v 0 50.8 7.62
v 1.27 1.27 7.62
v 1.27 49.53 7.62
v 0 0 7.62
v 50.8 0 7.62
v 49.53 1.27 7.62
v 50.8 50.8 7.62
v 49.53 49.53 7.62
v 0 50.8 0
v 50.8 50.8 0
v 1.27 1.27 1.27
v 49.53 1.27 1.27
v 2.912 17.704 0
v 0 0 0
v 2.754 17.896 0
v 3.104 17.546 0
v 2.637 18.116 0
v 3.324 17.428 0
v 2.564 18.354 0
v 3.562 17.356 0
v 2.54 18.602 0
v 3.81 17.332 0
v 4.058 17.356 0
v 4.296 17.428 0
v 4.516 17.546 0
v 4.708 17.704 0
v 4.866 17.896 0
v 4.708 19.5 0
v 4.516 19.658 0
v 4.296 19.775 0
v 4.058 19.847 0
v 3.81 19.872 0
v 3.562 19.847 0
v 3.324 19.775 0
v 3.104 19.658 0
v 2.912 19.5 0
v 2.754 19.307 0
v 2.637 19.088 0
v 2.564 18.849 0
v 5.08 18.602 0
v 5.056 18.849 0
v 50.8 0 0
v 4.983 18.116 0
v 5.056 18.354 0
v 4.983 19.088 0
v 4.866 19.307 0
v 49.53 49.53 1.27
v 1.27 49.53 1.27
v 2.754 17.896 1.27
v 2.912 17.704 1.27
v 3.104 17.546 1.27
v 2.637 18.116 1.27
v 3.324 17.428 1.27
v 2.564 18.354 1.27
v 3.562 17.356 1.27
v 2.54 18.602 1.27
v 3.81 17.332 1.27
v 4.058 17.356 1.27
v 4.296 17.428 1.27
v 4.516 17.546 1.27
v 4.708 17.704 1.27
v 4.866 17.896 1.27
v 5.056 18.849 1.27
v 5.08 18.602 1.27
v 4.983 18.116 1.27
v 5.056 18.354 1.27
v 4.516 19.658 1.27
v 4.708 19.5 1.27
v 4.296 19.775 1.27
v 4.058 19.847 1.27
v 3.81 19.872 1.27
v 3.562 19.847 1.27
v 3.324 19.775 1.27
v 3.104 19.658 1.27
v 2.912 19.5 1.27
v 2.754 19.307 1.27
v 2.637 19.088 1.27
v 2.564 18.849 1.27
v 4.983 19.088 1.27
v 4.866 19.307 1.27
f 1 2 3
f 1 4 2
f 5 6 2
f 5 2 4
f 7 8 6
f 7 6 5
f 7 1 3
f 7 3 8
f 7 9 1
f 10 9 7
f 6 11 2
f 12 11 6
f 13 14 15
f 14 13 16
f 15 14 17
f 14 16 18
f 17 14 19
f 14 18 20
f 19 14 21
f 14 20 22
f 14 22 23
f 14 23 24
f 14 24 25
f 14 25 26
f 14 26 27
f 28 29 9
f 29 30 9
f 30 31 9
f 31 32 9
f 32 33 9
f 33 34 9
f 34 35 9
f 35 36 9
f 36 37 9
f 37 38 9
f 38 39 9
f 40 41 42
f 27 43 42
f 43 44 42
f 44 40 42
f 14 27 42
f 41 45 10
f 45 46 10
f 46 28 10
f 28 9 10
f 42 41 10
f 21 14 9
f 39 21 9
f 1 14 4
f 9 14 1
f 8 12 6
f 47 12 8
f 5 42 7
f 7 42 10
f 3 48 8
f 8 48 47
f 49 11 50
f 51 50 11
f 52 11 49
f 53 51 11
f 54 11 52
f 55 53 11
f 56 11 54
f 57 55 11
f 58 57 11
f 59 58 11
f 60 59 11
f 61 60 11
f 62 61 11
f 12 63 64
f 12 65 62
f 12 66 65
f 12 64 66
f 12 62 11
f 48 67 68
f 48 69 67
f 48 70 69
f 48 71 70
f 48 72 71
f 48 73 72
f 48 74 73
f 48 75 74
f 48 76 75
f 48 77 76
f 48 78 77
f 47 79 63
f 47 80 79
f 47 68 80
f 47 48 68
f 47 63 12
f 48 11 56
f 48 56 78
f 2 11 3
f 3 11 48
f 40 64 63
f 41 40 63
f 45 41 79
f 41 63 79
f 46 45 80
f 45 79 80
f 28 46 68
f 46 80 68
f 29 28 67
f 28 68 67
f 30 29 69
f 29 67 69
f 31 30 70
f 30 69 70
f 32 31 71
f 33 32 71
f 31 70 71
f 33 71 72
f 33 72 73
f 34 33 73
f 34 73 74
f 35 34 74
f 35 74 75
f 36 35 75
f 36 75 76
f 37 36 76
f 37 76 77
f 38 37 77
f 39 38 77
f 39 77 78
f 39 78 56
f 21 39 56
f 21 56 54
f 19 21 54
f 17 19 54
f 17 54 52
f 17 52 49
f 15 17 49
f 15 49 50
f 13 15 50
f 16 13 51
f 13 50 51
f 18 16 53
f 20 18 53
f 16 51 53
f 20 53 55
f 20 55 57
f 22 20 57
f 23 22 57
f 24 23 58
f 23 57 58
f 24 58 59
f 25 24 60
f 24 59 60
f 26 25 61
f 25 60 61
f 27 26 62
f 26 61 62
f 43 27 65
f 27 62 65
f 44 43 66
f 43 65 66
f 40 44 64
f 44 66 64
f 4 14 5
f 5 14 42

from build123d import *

# Parameters (mm, degrees)
F0_W     = 50.8
F0_H     = 50.8
F1_DEPTH = 7.62
F2_T     = -1.27
F3_R     = 1.27
F4_DEPTH = 25.4


with BuildPart() as f1:
    # F0 (on Top) → F1 (new body)
    with BuildSketch(Plane.XY):
        with Locations((25.4, 25.4)):
            Rectangle(F0_W, F0_H)
    extrude(amount=F1_DEPTH)

    # F2
    f2_openings = [f1.faces().sort_by_distance(p)[0] for p in [
        (25.4, 25.4, 7.62),
    ]]
    offset(amount=F2_T, openings=f2_openings)

    # F3 (on face) → F4 (cut)
    with BuildSketch(Plane.XY.offset(1.27)):
        with Locations((3.81, 18.601548)):
            Circle(F3_R)
    extrude(amount=-F4_DEPTH, mode=Mode.SUBTRACT)


solid = f1.part
